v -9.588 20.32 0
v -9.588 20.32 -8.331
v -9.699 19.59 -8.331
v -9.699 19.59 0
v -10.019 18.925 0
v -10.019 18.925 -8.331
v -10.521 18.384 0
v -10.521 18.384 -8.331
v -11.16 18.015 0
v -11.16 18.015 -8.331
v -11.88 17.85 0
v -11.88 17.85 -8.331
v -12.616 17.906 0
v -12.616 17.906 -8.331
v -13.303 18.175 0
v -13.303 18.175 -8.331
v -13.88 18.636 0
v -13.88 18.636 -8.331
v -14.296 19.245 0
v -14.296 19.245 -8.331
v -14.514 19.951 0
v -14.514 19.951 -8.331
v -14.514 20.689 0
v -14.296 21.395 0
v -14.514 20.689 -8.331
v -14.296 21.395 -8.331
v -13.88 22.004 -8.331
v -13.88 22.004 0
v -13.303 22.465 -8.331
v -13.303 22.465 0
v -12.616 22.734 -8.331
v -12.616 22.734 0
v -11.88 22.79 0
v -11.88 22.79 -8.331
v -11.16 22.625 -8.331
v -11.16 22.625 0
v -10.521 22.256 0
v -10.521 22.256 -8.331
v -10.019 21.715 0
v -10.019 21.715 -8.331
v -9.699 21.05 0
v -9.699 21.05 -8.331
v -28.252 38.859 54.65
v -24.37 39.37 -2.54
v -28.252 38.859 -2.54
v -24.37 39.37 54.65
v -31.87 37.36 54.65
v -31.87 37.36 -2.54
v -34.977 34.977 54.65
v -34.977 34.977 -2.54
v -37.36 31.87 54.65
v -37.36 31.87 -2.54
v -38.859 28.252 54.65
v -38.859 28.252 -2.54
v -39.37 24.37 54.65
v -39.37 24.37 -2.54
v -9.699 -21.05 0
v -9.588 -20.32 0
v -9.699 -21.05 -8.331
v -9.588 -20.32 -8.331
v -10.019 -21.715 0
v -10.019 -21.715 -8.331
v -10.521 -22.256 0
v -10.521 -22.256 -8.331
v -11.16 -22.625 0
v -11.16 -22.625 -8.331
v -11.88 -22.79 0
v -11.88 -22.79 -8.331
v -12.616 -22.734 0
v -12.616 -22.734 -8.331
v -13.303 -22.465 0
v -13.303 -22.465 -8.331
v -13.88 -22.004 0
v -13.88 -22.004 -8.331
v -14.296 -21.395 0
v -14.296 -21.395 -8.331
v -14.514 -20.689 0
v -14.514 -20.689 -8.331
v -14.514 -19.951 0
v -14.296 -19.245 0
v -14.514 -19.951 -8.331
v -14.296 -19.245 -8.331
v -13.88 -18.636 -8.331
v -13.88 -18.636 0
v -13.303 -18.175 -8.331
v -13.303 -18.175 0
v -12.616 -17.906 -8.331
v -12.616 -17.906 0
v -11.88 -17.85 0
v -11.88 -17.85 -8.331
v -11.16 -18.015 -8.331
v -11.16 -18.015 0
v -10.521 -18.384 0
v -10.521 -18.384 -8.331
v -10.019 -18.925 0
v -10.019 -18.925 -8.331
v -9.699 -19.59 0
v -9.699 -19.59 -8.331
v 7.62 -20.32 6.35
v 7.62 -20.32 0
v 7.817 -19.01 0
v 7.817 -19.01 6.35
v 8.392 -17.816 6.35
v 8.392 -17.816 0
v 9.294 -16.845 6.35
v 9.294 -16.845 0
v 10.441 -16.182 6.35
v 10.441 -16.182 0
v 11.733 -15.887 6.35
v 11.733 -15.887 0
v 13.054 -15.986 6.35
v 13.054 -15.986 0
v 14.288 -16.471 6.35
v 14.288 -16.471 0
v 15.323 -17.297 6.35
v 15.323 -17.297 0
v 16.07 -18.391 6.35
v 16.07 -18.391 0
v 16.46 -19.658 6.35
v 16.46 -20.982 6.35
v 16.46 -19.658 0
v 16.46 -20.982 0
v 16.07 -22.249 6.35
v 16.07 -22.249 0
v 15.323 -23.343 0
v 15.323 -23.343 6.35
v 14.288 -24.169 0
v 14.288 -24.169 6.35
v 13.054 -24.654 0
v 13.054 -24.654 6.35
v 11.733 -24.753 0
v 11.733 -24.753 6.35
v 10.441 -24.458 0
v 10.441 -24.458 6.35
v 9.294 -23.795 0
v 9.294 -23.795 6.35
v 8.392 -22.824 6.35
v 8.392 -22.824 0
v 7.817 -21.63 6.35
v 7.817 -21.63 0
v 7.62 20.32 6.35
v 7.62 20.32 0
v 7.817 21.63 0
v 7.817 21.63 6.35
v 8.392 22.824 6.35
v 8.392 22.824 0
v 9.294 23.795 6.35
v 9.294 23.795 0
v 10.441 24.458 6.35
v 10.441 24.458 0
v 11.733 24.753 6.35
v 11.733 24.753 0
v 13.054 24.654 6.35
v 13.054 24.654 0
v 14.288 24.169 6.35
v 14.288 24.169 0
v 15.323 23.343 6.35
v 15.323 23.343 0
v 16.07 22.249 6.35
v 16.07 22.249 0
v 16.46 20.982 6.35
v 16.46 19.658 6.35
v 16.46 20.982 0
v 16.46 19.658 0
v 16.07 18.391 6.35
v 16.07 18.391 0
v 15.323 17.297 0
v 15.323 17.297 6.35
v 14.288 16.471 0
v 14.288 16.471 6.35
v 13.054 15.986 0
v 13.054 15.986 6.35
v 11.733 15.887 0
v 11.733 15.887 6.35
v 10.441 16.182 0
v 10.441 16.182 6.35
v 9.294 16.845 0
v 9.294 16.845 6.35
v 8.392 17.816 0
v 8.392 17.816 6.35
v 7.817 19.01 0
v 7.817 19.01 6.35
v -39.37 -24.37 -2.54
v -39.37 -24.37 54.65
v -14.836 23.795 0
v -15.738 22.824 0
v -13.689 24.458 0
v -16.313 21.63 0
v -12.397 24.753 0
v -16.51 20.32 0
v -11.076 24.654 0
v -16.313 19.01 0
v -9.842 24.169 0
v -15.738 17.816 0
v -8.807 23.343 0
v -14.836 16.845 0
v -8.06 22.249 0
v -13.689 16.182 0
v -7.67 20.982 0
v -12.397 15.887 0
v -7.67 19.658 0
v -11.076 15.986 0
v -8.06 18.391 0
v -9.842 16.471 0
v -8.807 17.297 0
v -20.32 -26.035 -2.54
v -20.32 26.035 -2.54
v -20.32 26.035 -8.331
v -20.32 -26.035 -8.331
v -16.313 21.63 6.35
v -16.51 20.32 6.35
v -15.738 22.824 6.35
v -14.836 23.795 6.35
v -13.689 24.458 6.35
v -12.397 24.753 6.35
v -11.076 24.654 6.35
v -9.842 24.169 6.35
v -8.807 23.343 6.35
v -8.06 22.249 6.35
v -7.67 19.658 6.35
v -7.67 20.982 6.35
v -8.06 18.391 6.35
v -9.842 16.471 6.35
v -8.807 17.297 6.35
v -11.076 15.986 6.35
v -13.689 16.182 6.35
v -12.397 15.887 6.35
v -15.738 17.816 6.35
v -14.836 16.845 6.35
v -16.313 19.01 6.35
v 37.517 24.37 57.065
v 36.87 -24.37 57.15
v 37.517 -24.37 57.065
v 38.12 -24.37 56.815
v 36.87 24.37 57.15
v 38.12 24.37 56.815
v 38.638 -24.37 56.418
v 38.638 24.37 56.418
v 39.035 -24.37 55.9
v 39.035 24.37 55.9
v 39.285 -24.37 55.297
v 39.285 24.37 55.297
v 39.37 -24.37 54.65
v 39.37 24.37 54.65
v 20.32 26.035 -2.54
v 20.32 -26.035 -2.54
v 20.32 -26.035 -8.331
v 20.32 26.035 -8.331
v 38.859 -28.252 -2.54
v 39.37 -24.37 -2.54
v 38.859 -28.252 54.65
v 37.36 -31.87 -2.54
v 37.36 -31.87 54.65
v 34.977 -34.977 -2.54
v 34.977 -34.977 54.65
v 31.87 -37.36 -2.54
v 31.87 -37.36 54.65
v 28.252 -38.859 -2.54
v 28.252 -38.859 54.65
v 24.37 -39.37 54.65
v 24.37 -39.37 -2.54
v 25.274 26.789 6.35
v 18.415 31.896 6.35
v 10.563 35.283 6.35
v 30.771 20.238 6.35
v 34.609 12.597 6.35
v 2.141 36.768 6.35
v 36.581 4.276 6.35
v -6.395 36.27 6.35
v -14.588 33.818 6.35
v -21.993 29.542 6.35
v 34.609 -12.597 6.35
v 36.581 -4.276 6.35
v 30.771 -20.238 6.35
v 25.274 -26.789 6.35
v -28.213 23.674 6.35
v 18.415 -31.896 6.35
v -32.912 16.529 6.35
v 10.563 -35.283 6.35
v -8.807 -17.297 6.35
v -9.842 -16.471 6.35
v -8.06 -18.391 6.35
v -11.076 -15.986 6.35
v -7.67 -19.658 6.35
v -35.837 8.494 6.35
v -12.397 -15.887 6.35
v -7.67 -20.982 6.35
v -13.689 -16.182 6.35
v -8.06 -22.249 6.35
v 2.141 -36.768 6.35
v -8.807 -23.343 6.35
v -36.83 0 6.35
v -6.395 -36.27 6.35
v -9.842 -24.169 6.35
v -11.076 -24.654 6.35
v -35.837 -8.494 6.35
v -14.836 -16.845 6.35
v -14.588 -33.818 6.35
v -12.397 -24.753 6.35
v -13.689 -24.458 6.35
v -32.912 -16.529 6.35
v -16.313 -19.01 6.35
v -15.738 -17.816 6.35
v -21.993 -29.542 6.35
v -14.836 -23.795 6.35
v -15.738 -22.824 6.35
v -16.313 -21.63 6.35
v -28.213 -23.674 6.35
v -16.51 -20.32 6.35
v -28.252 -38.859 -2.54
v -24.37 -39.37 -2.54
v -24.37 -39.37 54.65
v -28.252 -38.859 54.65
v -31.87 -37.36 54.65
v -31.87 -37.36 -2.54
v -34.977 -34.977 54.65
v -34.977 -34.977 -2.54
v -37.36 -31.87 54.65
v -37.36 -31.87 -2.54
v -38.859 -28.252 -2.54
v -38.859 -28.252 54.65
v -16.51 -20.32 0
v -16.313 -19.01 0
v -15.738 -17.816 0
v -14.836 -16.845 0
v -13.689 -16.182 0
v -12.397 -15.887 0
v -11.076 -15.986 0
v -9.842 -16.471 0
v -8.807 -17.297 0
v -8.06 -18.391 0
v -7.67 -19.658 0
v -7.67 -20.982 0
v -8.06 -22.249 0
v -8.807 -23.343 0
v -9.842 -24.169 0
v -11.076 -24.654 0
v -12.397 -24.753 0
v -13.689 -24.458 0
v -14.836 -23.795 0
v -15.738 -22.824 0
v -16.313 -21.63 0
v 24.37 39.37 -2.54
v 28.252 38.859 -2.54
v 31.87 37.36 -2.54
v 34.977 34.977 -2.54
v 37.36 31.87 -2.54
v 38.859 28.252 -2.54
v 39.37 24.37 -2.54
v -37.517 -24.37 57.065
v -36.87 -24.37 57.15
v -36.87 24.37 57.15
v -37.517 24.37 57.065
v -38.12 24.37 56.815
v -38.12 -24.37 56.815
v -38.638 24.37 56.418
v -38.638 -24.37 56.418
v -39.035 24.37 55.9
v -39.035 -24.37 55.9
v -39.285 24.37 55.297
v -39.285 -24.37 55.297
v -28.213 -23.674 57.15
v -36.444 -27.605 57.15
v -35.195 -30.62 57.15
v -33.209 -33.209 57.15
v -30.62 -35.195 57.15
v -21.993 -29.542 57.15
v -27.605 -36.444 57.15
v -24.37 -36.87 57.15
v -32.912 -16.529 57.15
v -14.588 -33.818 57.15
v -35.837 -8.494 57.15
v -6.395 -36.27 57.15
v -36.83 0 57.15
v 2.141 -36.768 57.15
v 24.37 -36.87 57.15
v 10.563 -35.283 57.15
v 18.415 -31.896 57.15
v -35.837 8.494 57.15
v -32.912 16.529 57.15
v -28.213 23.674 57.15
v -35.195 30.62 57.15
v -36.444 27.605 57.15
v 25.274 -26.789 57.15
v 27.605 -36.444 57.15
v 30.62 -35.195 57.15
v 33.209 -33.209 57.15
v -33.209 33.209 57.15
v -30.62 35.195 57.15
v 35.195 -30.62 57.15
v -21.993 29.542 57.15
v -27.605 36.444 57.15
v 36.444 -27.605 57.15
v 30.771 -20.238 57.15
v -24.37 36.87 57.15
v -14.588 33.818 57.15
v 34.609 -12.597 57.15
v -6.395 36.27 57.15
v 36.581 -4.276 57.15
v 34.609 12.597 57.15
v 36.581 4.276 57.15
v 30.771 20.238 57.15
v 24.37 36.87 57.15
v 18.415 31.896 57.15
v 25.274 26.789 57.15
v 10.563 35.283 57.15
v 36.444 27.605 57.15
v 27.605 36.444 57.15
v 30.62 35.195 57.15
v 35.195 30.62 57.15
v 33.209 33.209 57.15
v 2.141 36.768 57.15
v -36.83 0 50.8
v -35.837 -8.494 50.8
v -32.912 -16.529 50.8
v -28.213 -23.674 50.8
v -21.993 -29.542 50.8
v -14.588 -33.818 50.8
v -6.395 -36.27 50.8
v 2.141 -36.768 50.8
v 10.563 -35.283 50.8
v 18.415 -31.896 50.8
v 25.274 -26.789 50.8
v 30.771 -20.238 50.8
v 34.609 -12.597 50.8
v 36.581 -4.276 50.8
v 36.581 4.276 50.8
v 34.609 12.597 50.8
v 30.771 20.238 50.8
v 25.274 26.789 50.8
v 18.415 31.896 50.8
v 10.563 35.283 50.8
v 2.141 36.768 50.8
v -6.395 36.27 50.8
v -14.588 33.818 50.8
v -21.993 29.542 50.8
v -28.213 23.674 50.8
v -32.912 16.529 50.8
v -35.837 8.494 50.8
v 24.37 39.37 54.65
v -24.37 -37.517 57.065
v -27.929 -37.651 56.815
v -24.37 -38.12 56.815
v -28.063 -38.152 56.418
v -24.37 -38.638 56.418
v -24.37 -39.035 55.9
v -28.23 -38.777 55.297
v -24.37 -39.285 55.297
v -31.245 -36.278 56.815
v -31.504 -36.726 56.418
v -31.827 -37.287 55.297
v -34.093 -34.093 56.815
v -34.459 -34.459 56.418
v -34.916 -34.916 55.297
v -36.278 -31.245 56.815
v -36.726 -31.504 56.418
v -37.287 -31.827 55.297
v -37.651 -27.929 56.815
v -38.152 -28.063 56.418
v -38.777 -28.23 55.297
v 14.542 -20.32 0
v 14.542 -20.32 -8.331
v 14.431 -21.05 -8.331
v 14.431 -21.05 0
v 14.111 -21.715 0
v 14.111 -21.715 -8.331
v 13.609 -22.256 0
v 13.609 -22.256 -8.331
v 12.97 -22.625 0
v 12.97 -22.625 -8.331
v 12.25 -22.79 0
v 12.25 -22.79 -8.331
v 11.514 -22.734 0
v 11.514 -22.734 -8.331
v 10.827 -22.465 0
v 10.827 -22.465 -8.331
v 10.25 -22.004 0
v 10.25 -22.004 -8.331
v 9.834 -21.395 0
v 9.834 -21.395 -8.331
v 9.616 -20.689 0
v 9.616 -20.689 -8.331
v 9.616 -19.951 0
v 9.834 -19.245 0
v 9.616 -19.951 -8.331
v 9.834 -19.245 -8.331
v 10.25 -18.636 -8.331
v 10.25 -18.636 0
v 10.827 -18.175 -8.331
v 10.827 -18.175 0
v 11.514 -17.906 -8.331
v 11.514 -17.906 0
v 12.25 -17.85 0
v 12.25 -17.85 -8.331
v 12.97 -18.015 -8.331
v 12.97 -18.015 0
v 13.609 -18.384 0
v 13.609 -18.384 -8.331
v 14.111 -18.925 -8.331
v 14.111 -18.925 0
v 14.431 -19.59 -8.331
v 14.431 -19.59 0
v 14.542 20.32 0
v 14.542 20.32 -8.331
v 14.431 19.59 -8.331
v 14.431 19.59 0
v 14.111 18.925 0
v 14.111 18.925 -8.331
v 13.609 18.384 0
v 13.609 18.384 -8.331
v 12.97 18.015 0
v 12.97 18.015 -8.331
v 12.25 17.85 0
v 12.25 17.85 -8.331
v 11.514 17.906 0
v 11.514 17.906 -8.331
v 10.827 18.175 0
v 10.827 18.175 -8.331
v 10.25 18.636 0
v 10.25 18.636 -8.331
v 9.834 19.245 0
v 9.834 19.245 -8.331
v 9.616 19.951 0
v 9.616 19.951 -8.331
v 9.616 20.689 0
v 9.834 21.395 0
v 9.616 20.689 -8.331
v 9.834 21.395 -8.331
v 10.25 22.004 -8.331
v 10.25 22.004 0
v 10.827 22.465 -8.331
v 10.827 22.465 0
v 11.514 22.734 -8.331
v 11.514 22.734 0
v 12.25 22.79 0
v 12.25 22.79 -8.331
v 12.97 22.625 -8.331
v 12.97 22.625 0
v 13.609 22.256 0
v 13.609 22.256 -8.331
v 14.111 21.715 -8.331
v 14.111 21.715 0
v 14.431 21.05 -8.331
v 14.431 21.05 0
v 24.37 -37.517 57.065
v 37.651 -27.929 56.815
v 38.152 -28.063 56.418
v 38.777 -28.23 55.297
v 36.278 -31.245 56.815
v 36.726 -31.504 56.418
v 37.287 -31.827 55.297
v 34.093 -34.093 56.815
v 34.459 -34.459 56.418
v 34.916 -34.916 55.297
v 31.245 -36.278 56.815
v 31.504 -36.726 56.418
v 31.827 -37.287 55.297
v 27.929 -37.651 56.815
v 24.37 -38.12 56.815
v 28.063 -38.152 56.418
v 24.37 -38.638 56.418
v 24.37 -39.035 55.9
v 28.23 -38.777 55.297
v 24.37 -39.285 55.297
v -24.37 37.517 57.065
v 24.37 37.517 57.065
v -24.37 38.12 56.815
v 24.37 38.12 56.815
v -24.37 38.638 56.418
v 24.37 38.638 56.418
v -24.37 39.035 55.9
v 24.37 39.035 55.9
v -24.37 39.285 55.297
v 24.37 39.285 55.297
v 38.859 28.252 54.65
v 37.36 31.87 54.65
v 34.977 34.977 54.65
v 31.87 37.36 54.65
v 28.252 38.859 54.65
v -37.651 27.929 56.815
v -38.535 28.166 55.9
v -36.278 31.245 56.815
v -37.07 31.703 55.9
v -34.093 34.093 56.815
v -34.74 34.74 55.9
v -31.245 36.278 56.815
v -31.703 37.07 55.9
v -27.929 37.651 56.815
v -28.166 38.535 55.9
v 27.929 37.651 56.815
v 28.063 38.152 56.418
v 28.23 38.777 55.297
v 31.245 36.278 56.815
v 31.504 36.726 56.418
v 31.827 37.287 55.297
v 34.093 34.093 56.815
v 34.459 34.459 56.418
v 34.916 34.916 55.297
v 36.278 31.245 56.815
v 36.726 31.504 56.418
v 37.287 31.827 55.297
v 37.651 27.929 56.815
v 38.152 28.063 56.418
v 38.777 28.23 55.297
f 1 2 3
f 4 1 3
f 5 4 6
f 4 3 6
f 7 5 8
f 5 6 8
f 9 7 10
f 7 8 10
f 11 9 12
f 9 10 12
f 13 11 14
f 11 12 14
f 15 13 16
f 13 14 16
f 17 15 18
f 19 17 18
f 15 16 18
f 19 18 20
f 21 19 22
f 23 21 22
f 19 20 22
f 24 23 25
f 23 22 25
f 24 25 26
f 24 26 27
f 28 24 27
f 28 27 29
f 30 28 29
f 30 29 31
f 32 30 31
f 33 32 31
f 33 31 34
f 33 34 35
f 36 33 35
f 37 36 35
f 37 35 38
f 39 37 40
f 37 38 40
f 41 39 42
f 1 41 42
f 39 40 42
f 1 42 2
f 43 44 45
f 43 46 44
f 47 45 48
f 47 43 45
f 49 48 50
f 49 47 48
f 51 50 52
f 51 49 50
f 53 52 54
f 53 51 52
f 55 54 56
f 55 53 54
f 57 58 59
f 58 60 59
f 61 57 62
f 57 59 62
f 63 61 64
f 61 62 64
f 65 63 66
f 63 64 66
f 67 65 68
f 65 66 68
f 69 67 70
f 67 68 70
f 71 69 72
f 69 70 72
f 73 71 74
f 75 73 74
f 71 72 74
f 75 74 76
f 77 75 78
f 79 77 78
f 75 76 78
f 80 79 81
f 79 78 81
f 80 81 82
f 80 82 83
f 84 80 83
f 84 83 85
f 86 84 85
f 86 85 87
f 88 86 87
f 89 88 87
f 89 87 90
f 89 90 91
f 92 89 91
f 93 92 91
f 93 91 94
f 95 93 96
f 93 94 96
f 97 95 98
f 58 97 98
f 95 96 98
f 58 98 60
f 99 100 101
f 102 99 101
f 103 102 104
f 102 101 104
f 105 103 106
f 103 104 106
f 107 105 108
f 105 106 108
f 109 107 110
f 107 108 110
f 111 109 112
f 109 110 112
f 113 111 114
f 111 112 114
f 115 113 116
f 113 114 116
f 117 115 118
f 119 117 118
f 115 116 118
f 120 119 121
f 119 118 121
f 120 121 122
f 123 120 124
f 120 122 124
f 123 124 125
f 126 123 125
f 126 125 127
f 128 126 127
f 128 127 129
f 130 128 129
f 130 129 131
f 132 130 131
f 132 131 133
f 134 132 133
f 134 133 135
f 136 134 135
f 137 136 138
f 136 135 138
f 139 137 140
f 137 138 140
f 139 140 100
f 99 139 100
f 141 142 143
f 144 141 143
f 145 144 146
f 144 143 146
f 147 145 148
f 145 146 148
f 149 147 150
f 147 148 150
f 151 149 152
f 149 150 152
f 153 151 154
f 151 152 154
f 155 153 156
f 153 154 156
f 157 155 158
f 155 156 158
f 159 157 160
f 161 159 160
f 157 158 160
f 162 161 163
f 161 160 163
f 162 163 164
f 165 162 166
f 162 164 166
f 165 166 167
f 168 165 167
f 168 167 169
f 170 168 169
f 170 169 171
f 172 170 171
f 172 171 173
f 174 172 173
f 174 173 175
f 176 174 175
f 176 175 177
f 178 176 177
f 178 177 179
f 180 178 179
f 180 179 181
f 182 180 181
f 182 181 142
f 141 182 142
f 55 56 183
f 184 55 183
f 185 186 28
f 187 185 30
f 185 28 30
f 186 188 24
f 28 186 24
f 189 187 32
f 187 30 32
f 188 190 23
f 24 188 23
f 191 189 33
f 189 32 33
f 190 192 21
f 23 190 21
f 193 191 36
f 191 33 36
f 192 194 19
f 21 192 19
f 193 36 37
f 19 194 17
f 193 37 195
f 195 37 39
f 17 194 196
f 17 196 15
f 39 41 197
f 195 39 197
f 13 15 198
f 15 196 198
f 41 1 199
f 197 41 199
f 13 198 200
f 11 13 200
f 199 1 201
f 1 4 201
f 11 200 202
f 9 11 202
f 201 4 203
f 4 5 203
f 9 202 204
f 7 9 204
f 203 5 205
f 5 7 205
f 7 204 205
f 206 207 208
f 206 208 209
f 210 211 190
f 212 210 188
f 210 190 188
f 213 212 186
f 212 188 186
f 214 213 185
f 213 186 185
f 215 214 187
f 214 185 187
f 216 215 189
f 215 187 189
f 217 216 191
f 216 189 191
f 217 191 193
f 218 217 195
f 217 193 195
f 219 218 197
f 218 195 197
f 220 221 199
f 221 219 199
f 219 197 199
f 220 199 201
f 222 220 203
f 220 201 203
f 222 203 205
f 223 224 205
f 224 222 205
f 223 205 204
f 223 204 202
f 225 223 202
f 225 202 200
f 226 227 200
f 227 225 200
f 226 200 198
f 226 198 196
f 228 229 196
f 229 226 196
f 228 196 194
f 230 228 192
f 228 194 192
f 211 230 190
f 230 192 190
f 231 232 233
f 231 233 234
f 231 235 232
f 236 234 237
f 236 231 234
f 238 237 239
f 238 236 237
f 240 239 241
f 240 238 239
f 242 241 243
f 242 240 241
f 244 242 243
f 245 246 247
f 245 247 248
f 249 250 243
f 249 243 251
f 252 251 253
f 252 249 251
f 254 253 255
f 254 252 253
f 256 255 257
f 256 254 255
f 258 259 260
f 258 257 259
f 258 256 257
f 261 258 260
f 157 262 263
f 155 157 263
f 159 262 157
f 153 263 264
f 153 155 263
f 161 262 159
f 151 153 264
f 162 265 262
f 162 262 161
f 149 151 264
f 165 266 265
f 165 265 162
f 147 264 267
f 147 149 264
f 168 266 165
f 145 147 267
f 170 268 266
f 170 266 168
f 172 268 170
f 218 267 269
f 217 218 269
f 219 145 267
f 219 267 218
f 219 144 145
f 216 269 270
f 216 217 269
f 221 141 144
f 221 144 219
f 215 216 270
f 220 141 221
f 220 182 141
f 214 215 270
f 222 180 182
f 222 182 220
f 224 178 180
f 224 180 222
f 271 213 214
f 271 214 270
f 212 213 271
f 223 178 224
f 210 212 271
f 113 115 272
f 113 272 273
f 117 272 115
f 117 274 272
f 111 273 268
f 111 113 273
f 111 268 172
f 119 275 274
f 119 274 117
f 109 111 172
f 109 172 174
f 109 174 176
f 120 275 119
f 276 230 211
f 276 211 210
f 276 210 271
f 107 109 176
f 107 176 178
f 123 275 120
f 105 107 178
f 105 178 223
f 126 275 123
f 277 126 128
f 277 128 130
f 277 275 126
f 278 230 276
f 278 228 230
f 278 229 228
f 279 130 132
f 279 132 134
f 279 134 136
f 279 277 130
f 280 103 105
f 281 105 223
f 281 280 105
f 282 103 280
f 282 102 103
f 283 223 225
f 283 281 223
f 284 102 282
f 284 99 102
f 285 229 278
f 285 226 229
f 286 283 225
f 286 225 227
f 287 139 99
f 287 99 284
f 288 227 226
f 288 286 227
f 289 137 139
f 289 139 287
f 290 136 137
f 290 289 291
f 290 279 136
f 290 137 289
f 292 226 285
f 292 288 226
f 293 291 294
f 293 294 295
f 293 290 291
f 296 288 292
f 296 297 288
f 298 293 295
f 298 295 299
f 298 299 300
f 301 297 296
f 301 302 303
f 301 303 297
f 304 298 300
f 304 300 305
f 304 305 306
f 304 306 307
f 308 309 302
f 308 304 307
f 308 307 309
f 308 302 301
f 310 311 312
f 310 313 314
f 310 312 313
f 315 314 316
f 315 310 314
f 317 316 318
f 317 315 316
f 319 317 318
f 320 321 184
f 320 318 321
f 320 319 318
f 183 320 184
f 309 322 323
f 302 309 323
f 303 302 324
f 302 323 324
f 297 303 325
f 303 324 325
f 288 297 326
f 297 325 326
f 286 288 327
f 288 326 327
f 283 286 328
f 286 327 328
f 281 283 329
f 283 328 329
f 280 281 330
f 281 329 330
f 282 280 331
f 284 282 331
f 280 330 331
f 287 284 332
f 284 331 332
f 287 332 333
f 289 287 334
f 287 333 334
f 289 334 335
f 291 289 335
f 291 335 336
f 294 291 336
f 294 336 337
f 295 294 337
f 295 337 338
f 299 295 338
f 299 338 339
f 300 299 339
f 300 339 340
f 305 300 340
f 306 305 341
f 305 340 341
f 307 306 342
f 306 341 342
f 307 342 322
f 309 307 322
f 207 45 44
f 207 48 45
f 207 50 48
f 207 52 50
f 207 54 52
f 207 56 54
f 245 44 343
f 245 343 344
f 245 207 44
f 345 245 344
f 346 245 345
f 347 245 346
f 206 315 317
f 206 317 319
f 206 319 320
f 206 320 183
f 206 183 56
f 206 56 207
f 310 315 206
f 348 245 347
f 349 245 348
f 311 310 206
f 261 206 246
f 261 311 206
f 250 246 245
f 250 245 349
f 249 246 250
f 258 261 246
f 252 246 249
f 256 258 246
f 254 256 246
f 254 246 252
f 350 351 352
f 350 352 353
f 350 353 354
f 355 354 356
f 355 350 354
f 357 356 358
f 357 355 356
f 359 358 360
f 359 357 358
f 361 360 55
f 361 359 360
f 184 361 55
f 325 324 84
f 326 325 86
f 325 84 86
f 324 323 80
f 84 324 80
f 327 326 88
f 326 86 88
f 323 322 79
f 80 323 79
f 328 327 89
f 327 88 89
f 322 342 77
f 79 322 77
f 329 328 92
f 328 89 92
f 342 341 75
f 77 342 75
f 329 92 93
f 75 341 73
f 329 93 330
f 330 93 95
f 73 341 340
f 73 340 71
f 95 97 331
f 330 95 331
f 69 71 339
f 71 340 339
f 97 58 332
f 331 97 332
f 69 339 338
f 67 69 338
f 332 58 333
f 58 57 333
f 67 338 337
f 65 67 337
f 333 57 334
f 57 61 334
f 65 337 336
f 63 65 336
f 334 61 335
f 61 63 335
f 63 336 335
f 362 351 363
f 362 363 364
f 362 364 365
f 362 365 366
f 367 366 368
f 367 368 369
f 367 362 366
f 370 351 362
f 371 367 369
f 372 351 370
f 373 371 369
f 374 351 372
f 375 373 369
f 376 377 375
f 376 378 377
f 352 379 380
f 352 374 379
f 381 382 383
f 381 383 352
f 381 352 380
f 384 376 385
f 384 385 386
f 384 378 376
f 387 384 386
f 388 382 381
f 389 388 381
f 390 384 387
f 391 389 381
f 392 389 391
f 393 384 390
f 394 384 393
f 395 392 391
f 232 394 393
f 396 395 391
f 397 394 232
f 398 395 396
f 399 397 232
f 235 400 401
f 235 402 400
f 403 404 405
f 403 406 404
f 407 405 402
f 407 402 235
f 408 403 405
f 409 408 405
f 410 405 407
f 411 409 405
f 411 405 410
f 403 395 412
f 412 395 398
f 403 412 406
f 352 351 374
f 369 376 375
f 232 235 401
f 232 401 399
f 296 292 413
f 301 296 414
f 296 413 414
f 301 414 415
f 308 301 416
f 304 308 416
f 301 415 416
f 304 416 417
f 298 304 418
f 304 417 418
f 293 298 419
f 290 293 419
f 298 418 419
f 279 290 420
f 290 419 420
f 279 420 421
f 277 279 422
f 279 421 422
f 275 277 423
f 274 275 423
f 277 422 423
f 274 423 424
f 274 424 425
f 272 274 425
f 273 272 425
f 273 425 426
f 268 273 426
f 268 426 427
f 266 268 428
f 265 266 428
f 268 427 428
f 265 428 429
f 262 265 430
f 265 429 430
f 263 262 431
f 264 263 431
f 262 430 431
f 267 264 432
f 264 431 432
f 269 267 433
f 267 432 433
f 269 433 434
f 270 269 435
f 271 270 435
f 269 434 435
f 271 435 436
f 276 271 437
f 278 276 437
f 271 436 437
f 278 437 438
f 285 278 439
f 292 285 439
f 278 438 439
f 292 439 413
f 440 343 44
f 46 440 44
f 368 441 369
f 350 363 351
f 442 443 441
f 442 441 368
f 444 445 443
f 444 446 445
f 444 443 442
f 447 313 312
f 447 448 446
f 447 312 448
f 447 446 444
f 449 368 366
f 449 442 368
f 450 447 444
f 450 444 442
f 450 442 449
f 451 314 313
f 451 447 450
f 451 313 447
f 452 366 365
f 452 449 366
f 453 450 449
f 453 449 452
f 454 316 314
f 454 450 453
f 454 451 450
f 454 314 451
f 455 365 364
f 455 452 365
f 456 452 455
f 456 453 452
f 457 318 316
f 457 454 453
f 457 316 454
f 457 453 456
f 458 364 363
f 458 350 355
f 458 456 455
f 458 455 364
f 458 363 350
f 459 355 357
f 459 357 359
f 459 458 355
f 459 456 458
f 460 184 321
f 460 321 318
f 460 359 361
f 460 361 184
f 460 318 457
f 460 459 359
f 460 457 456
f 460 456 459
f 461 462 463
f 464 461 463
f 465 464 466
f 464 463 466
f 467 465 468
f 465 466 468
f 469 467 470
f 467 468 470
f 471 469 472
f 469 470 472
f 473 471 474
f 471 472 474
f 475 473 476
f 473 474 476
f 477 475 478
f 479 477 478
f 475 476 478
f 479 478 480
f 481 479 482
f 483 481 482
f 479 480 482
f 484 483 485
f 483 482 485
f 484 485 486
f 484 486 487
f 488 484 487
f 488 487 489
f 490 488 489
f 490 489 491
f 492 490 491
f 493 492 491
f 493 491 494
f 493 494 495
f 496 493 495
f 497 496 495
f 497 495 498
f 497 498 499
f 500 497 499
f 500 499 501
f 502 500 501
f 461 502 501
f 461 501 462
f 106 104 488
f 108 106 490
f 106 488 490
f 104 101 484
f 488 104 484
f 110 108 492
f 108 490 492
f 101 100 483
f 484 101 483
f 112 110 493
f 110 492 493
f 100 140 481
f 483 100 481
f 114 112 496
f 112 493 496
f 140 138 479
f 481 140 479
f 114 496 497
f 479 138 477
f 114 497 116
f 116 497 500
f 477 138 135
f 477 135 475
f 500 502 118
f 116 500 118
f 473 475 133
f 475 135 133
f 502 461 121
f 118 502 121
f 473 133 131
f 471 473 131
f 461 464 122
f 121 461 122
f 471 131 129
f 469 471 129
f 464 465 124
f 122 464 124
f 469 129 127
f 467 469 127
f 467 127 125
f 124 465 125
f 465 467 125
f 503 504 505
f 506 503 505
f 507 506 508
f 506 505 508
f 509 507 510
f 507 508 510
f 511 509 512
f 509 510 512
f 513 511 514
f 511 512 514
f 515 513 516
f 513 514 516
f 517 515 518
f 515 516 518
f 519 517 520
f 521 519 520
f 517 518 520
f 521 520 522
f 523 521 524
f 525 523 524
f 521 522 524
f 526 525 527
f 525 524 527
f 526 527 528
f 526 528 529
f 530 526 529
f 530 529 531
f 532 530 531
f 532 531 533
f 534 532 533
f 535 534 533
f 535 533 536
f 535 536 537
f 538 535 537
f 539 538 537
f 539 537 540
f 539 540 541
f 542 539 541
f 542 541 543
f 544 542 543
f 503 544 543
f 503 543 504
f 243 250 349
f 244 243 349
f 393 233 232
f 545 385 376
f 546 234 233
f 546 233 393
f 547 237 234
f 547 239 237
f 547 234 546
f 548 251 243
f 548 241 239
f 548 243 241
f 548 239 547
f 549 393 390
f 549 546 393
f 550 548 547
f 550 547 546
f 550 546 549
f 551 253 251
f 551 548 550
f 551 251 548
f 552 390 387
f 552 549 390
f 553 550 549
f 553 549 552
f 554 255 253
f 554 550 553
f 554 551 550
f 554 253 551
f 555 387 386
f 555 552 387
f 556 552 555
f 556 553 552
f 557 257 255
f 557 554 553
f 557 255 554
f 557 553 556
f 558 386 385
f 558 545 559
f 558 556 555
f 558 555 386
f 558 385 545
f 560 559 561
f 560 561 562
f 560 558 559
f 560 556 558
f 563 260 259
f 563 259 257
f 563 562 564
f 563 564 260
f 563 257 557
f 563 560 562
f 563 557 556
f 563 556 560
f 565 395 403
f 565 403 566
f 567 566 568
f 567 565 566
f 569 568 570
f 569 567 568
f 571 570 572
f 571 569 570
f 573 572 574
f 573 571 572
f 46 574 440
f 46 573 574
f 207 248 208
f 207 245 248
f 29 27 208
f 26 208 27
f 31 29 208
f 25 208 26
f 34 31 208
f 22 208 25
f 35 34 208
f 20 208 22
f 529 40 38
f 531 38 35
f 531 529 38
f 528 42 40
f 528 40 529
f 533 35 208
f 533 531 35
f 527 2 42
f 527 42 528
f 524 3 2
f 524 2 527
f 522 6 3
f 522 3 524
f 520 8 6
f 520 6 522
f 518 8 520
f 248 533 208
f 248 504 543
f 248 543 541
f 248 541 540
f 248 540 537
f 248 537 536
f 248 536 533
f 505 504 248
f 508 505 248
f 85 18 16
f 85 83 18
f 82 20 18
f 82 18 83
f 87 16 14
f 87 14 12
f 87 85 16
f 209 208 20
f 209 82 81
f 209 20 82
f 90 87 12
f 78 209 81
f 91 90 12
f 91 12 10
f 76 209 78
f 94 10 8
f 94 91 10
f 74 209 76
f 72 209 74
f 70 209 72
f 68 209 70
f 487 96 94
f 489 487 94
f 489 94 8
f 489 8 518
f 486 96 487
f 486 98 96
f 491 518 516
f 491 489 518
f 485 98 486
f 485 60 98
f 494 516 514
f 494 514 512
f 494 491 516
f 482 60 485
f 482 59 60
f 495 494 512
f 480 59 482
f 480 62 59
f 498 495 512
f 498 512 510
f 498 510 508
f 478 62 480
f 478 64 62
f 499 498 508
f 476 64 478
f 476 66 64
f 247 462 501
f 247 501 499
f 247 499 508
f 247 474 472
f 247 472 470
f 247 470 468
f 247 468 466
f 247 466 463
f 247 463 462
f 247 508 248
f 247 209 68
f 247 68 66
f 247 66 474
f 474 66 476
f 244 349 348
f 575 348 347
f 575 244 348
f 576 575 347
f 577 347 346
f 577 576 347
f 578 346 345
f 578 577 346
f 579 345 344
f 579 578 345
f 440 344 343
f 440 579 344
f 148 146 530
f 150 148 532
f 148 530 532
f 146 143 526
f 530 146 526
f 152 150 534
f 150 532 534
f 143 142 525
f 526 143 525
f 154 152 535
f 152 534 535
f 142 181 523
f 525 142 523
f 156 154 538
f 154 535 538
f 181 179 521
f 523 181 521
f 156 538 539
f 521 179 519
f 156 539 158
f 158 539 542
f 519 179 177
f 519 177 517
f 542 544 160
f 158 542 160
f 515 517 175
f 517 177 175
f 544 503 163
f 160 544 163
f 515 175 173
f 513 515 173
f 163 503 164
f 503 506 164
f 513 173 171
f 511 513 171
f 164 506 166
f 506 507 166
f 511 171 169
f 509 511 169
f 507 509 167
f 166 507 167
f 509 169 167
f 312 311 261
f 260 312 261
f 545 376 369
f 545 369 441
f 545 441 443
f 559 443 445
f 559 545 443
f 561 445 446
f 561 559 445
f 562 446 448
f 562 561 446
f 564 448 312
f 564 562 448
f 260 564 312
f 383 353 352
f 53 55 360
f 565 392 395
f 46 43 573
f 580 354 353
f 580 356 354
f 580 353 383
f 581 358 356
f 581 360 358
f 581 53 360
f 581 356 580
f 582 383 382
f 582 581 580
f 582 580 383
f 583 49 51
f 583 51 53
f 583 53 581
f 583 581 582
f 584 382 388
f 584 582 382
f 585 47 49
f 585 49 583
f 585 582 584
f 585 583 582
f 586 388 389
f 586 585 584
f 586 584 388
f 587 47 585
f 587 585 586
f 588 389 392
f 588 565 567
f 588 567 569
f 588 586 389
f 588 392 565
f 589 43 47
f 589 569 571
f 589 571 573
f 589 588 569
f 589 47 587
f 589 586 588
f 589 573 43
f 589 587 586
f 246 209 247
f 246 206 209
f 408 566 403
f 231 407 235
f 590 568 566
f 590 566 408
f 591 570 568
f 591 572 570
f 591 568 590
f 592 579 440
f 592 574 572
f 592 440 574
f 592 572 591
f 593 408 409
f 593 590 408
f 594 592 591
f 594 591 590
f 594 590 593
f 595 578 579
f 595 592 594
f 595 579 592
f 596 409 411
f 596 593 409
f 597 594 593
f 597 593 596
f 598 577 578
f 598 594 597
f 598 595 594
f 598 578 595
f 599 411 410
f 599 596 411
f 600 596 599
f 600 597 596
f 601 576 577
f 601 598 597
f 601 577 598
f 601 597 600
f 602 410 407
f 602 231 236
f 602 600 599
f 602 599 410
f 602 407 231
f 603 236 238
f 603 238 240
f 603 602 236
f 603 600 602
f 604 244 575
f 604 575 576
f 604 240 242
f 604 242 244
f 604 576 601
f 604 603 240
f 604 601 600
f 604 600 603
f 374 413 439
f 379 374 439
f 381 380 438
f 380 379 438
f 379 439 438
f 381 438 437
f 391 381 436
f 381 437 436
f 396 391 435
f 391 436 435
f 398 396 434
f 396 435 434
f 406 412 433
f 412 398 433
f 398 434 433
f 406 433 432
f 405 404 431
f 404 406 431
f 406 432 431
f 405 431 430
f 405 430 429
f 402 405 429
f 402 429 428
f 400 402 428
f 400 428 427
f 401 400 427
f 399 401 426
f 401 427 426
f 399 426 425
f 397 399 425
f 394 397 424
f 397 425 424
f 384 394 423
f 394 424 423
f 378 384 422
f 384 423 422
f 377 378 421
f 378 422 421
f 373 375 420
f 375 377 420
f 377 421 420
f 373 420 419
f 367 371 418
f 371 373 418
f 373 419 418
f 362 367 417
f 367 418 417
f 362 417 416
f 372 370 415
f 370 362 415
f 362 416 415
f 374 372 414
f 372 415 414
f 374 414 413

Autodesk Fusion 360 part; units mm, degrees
sketch "Sketch1" plane through (0, 0, 0) normal (0, 0, 1) x (1, 0, 0)
  line L0 (39.37, 39.37) -> (-39.37, 39.37)
  line L1 (-39.37, 39.37) -> (-39.37, -39.37)
  line L2 (-39.37, -39.37) -> (39.37, -39.37)
  line L3 (39.37, -39.37) -> (39.37, 39.37)
  line L4 (39.37, 39.37) -> (-39.37, -39.37) construction
  line L5 (-39.37, 39.37) -> (39.37, -39.37) construction
  dimension "d9" = 78.74
  dimension "d10" = 78.74
extrude "Extrude1" add sketch "Sketch1" along normal blind 50.8
sketch "Sketch2" plane through (0, 0, 50.8) normal (0, 0, 1) x (-1, 0, 0)
  line L0 (-39.37, 39.37) -> (-39.37, -39.37)
  line L1 (-39.37, -39.37) -> (39.37, -39.37)
  line L2 (39.37, -39.37) -> (39.37, 39.37)
  line L3 (39.37, 39.37) -> (-39.37, 39.37)
  circle A0 centre (0, 0) radius 36.83
  dimension "d13" = 73.66
extrude "Extrude2" cut sketch "Sketch2" against normal up to surface (50.8 mm away) contours A0
sketch "Sketch3" plane through (0, 0, 0) normal (0, 0, -1) x (1, 0, 0)
  circle A0 centre (0, 0) radius 36.83
  line L0 (39.37, -39.37) -> (39.37, 39.37)
  line L1 (39.37, 39.37) -> (-39.37, 39.37)
  line L2 (-39.37, 39.37) -> (-39.37, -39.37)
  line L3 (-39.37, -39.37) -> (39.37, -39.37)
  line L4 (-39.37, 39.37) -> (39.37, 39.37)
  line L5 (39.37, 39.37) -> (39.37, -39.37)
  line L6 (39.37, -39.37) -> (-39.37, -39.37)
  line L7 (-39.37, -39.37) -> (-39.37, 39.37)
extrude "Extrude3" add sketch "Sketch3" along normal blind 2.54 contours A0 | L0 L1 L2 L3 L4 L5 L6 L7
sketch "Sketch4" plane through (0, 0, -2.54) normal (0, 0, -1) x (1, 0, 0)
  line L0 (-39.37, -39.37) -> (39.37, -39.37)
  line L1 (39.37, -39.37) -> (39.37, 39.37)
  line L2 (39.37, 39.37) -> (-39.37, 39.37)
  line L3 (-39.37, 39.37) -> (-39.37, -39.37)
  line L4 (-20.32, 26.035) -> (20.32, 26.035)
  line L5 (20.32, 26.035) -> (20.32, -26.035)
  line L6 (20.32, -26.035) -> (-20.32, -26.035)
  line L7 (-20.32, -26.035) -> (-20.32, 26.035)
  line L8 (-20.32, 26.035) -> (20.32, -26.035) construction
  line L9 (20.32, 26.035) -> (-20.32, -26.035) construction
  dimension "d18" = 40.64
  dimension "d19" = 52.07
extrude "Extrude4" add sketch "Sketch4" along normal blind 5.7912 contours L4 L5 L6 L7
sketch "Sketch5" plane through (0, 0, -8.3312) normal (0, 0, -1) x (1, 0, 0)
  line L0 (-20.32, -26.035) -> (20.32, -26.035)
  line L1 (20.32, -26.035) -> (20.32, 26.035)
  line L2 (20.32, 26.035) -> (-20.32, 26.035)
  line L3 (-20.32, 26.035) -> (-20.32, -26.035)
  line L4 (-12.065, 20.32) -> (12.065, 20.32)
  line L5 (12.065, 20.32) -> (12.065, -20.32)
  line L6 (12.065, -20.32) -> (-12.065, -20.32)
  line L7 (-12.065, -20.32) -> (-12.065, 20.32)
  line L8 (-12.065, 20.32) -> (12.065, -20.32) construction
  line L9 (12.065, 20.32) -> (-12.065, -20.32) construction
  circle A0 centre (12.065, -20.32) radius 2.4765
  circle A1 centre (-12.065, -20.32) radius 2.4765
  circle A2 centre (-12.065, 20.32) radius 2.4765
  circle A3 centre (12.065, 20.32) radius 2.4765
  dimension "d23" = 24.13
  dimension "d24" = 40.64
  dimension "d26" = 4.953
  dimension "d27" = 4.953
  dimension "d28" = 4.953
  dimension "d29" = 4.953
extrude "Extrude5" cut sketch "Sketch5" against normal up to surface (59.1312 mm away) contours L4 L7 A2 | L4 L7 A2 | L4 L5 A3 | L4 L5 A3 | L6 L7 A1 | L6 L7 A1 | L5 L6 A0 | L5 L6 A0
sketch "Sketch6" plane through (0, 0, 0) normal (0, 0, 1) x (-1, 0, 0)
  circle A0 centre (12.065, -20.32) radius 2.4765
  circle A1 centre (12.065, 20.32) radius 2.4765
  circle A2 centre (-12.065, -20.32) radius 2.4765
  circle A3 centre (-12.065, 20.32) radius 2.4765
  circle A4 centre (0, 0) radius 36.83
  line L0 (-12.065, 20.32) -> (12.065, 20.32)
  line L1 (12.065, 20.32) -> (12.065, -20.32)
  line L2 (12.065, -20.32) -> (-12.065, -20.32)
  line L3 (-12.065, -20.32) -> (-12.065, 20.32)
  circle A5 centre (-12.065, 20.32) radius 4.445
  circle A6 centre (12.065, 20.32) radius 4.445
  circle A7 centre (-12.065, -20.32) radius 4.445
  circle A8 centre (12.065, -20.32) radius 4.445
  dimension "d33" = 8.89
  dimension "d34" = 8.89
  dimension "d35" = 8.89
  dimension "d36" = 8.89
extrude "Extrude6" add sketch "Sketch6" along normal blind 6.35 contours L0 L1 L2 L3 A5 A6 A7 A8 | A4
extrude "Extrude7" add 1 faces at (29.7771, -31.0719, 50.8) along direction (0, 0, 1) blind 6.35
fillet "Fillet1" radius 15 4 edges at (39.37, -39.37, 27.305) (39.37, 39.37, 27.305) (-39.37, -39.37, 27.305) (-39.37, 39.37, 27.305)
fillet "Fillet2" radius 2.5 8 edges at (-34.9766, 34.9766, 57.15) (-39.37, 0, 57.15) (-34.9766, -34.9766, 57.15) (0, -39.37, 57.15) (34.9766, -34.9766, 57.15) (39.37, 0, 57.15) (34.9766, 34.9766, 57.15) (0, 39.37, 57.15)
equation "CupBaseDiameter = 2.7 in"
equation "CupHeight = 2 in"
equation "CupTopDiameter = 2.9 in"
equation "HoleDistanceLength = 0.95 in"
equation "HoleDistanceWidth = 1.6 in"
equation "BaseLength = 1.6 in"
equation "BaseWidth = 2.05 in"
equation "CupTop = CupTopDiameter + 0.2 in"
equation "d9 = CupTop"
equation "d10 = CupTop"
equation "d11 = CupHeight"
equation "d13 = CupTopDiameter"
equation "d18 = BaseLength"
equation "d19 = BaseWidth"
equation "BaseHeight = 0.228 in"
equation "d21 = BaseHeight"
equation "d23 = HoleDistanceLength"
equation "d24 = HoleDistanceWidth"
equation "ScrewHoleDiameter = 0.195 in"
equation "d26 = ScrewHoleDiameter"
equation "d27 = ScrewHoleDiameter"
equation "d28 = ScrewHoleDiameter"
equation "d29 = ScrewHoleDiameter"
equation "ScrewTopDiamater = 0.35 in"
equation "d33 = ScrewTopDiamater"
equation "d34 = ScrewTopDiamater"
equation "d35 = ScrewTopDiamater"
equation "d36 = ScrewTopDiamater"
